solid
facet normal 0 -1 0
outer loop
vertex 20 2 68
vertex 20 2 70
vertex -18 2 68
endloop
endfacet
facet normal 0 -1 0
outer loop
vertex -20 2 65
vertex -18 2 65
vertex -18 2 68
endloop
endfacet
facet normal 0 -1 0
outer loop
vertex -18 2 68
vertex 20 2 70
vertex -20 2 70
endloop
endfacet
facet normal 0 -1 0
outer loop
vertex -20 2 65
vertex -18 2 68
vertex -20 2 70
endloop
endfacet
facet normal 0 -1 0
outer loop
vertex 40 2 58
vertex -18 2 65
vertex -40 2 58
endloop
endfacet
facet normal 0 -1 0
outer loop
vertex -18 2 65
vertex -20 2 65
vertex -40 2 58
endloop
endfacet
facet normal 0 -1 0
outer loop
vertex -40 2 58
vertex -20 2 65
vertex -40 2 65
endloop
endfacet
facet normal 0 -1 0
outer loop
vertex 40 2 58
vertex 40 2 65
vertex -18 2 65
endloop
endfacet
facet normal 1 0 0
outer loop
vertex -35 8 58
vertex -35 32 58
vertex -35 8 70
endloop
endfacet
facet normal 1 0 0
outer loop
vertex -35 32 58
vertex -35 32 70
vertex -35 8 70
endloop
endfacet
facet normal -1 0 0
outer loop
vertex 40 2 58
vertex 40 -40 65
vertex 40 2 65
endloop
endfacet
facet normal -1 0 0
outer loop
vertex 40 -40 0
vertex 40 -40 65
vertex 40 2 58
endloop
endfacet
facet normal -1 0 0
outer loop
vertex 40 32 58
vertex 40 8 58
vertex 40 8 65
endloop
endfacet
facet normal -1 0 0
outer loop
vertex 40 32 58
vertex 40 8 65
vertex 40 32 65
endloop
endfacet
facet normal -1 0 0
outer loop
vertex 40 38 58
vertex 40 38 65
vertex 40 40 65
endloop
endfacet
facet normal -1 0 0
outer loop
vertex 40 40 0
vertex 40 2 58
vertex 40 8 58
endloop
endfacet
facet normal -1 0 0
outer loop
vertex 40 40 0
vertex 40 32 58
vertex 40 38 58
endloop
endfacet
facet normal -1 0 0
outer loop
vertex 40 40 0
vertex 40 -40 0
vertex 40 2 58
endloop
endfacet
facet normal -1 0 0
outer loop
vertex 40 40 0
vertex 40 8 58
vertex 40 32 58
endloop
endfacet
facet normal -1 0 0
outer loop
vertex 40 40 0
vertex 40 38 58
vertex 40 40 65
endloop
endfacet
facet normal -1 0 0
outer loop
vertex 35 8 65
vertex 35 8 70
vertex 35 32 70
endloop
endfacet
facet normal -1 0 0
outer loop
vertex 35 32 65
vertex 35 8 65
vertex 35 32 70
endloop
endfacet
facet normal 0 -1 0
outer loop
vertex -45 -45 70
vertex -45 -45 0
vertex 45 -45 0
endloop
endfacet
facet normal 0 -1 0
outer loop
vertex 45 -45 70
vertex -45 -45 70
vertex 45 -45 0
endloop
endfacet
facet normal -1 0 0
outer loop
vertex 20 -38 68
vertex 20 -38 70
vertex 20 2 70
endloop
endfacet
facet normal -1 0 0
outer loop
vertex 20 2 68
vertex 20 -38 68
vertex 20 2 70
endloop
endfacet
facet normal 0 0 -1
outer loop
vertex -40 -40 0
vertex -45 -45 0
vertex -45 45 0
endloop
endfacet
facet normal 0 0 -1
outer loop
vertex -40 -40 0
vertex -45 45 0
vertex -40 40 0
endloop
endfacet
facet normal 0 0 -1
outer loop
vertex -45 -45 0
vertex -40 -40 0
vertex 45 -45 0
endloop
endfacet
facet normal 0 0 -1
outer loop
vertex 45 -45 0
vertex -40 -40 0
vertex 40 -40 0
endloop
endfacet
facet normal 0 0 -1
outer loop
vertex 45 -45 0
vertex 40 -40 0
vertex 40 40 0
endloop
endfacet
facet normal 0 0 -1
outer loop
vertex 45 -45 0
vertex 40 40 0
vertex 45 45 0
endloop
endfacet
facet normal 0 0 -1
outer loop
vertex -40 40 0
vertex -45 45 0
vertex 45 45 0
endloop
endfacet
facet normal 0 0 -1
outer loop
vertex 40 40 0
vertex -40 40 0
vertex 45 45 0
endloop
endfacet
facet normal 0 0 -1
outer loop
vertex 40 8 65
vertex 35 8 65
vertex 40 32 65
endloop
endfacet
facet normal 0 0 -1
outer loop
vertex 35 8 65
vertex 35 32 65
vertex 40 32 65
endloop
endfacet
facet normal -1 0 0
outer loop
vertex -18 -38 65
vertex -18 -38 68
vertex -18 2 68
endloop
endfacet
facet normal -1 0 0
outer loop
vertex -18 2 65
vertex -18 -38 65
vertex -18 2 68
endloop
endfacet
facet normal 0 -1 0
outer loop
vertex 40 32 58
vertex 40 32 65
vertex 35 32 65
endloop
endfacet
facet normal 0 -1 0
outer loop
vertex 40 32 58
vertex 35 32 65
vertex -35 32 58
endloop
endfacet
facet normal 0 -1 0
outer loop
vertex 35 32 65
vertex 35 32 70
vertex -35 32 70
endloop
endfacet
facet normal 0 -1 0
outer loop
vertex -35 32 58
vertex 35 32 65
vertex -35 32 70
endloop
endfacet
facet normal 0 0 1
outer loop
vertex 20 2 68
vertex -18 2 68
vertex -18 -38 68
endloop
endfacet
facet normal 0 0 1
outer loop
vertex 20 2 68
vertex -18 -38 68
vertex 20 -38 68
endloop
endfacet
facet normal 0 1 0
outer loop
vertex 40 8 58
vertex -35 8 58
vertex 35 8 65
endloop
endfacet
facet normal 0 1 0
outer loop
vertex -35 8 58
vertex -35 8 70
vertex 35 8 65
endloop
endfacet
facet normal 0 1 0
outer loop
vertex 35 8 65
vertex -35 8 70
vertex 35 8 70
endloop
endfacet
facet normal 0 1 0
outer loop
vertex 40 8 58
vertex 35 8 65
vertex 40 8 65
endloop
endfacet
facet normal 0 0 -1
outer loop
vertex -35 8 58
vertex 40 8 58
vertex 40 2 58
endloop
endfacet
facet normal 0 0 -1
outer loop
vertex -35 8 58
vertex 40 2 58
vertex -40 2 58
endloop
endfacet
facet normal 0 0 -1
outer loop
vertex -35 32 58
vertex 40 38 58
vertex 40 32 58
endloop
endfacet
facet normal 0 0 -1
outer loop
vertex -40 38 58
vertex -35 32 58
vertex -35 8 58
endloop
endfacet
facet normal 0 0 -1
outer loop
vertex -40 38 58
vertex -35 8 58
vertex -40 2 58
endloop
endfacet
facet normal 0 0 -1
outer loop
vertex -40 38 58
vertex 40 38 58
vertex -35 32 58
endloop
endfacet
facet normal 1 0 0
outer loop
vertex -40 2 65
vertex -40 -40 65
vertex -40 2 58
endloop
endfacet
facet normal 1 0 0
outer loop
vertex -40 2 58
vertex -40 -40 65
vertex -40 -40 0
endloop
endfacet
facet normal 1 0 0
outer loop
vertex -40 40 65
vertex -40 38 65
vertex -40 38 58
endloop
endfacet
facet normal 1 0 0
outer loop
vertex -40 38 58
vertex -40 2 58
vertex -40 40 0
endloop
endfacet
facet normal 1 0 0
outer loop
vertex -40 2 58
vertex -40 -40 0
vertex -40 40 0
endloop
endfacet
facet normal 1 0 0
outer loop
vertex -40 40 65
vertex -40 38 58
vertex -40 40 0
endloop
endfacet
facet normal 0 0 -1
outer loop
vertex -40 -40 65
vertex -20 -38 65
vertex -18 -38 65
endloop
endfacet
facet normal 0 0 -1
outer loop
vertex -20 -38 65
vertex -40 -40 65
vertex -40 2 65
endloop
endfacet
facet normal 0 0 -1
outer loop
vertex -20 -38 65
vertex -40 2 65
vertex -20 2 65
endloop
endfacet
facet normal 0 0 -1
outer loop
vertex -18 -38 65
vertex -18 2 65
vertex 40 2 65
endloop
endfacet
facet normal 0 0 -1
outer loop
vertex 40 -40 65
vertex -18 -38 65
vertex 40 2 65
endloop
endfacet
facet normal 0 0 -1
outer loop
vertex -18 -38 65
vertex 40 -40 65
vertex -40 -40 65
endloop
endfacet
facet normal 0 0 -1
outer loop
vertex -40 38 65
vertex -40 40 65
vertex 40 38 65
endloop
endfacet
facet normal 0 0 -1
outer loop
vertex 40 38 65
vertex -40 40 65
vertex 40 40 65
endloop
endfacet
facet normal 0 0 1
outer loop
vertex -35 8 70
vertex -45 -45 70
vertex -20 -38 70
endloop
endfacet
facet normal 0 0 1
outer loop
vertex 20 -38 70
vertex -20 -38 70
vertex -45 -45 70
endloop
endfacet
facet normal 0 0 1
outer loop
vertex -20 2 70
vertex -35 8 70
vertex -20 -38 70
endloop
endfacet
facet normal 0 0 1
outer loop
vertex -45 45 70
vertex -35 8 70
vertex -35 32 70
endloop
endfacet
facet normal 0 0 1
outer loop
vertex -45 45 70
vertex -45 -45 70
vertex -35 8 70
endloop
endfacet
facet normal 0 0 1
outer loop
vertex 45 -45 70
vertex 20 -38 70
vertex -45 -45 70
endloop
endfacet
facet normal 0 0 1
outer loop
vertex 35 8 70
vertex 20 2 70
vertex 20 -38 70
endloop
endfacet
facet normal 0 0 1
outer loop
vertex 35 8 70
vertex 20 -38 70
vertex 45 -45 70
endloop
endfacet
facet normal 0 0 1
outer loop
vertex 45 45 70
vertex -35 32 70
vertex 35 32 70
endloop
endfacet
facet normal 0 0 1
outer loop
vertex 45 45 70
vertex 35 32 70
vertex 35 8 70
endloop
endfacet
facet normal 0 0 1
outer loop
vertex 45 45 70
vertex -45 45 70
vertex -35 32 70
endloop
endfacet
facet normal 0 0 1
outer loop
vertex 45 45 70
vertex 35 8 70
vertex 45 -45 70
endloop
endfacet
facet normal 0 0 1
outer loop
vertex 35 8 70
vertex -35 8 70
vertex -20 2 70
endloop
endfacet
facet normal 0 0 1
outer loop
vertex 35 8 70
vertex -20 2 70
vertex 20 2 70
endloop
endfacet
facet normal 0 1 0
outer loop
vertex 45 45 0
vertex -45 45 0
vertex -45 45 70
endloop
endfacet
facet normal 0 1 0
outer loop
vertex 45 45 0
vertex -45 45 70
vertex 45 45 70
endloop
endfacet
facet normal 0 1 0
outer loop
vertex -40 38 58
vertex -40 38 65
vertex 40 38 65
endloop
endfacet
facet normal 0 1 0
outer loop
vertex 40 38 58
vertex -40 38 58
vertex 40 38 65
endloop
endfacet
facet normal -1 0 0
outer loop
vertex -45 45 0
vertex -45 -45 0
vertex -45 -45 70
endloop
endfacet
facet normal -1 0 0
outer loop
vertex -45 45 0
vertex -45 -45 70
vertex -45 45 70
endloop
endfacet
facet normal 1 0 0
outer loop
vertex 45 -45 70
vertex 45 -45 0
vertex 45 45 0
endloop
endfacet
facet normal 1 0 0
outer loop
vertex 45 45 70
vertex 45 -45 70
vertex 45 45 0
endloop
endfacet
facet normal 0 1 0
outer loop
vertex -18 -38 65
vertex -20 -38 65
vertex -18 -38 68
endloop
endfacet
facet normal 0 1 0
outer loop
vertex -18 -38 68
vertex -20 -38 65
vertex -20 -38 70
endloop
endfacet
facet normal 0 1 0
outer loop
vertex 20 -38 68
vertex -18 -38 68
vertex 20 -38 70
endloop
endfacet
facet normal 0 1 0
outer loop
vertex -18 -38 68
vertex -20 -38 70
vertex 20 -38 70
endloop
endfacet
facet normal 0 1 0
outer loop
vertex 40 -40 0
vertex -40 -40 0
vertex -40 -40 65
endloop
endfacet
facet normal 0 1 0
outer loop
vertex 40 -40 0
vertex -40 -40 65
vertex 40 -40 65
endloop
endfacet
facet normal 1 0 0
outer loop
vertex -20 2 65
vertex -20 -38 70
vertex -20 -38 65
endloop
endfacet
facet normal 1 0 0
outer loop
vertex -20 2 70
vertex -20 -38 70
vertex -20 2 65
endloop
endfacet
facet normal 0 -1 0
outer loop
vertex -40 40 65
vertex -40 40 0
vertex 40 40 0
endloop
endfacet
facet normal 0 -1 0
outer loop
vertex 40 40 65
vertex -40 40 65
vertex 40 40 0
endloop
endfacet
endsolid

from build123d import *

# Parameters (mm, degrees)
SKETCH1_W           = 90
SKETCH1_H           = 90
BOSS_EXTRUDE1_DEPTH = 70
SHELL2_T            = -5
CUT_EXTRUDE1_REACH  = 96.604
SKETCH2_W           = 70
SKETCH2_H           = 24
BOSS_EXTRUDE2_DEPTH = 7
SKETCH5_W           = 40
SKETCH5_H           = 40
CUT_EXTRUDE2_DEPTH  = 2
CUT_EXTRUDE3_REACH  = 95.134
SKETCH6_W           = 2
SKETCH6_H           = 40


with BuildPart() as part:
    # Sketch1 → Boss-Extrude1 (new body)
    with BuildSketch(Plane.XY):
        Rectangle(SKETCH1_W, SKETCH1_H)
    extrude(amount=BOSS_EXTRUDE1_DEPTH)

    # Shell2
    shell2_openings = [part.faces().sort_by_distance(p)[0] for p in [
        (0, 0, 0),
    ]]
    offset(amount=SHELL2_T, openings=shell2_openings, kind=Kind.INTERSECTION)

    # Sketch2 → Cut-Extrude1 (cut, up to next)
    with BuildSketch(Plane.XY.offset(70), mode=Mode.PRIVATE) as cut_extrude1_sk1:
        with Locations((0, 20)):
            Rectangle(SKETCH2_W, SKETCH2_H)
    cut_extrude1_tool1 = extrude(cut_extrude1_sk1.sketch, amount=-CUT_EXTRUDE1_REACH, mode=Mode.PRIVATE) & part.part
    add(cut_extrude1_tool1.solids().sort_by_distance((0, 20, 70))[0], mode=Mode.SUBTRACT)

    # Sketch4 → Boss-Extrude2 (add)
    with BuildSketch(Plane(origin=(0, 0, 65), x_dir=(-1, 0, 0), z_dir=(0, 0, -1))):
        Polygon((-40, 38), (-40, 32), (-35, 32), (35, 32), (35, 8), (-35, 8), (-40, 8), (-40, 2), (40, 2), (40, 38), align=None)
    extrude(amount=BOSS_EXTRUDE2_DEPTH)

    # Sketch5 → Cut-Extrude2 (cut)
    with BuildSketch(Plane.XY.offset(70)):
        with Locations((0, -18)):
            Rectangle(SKETCH5_W, SKETCH5_H)
    extrude(amount=-CUT_EXTRUDE2_DEPTH, mode=Mode.SUBTRACT)

    # Sketch6 → Cut-Extrude3 (cut, up to next)
    with BuildSketch(Plane.XY.offset(68), mode=Mode.PRIVATE) as cut_extrude3_sk1:
        with Locations((-19, -18)):
            Rectangle(SKETCH6_W, SKETCH6_H)
    cut_extrude3_tool1 = extrude(cut_extrude3_sk1.sketch, amount=-CUT_EXTRUDE3_REACH, mode=Mode.PRIVATE) & part.part
    add(cut_extrude3_tool1.solids().sort_by_distance((-19, -18, 68))[0], mode=Mode.SUBTRACT)


solid = part.part
